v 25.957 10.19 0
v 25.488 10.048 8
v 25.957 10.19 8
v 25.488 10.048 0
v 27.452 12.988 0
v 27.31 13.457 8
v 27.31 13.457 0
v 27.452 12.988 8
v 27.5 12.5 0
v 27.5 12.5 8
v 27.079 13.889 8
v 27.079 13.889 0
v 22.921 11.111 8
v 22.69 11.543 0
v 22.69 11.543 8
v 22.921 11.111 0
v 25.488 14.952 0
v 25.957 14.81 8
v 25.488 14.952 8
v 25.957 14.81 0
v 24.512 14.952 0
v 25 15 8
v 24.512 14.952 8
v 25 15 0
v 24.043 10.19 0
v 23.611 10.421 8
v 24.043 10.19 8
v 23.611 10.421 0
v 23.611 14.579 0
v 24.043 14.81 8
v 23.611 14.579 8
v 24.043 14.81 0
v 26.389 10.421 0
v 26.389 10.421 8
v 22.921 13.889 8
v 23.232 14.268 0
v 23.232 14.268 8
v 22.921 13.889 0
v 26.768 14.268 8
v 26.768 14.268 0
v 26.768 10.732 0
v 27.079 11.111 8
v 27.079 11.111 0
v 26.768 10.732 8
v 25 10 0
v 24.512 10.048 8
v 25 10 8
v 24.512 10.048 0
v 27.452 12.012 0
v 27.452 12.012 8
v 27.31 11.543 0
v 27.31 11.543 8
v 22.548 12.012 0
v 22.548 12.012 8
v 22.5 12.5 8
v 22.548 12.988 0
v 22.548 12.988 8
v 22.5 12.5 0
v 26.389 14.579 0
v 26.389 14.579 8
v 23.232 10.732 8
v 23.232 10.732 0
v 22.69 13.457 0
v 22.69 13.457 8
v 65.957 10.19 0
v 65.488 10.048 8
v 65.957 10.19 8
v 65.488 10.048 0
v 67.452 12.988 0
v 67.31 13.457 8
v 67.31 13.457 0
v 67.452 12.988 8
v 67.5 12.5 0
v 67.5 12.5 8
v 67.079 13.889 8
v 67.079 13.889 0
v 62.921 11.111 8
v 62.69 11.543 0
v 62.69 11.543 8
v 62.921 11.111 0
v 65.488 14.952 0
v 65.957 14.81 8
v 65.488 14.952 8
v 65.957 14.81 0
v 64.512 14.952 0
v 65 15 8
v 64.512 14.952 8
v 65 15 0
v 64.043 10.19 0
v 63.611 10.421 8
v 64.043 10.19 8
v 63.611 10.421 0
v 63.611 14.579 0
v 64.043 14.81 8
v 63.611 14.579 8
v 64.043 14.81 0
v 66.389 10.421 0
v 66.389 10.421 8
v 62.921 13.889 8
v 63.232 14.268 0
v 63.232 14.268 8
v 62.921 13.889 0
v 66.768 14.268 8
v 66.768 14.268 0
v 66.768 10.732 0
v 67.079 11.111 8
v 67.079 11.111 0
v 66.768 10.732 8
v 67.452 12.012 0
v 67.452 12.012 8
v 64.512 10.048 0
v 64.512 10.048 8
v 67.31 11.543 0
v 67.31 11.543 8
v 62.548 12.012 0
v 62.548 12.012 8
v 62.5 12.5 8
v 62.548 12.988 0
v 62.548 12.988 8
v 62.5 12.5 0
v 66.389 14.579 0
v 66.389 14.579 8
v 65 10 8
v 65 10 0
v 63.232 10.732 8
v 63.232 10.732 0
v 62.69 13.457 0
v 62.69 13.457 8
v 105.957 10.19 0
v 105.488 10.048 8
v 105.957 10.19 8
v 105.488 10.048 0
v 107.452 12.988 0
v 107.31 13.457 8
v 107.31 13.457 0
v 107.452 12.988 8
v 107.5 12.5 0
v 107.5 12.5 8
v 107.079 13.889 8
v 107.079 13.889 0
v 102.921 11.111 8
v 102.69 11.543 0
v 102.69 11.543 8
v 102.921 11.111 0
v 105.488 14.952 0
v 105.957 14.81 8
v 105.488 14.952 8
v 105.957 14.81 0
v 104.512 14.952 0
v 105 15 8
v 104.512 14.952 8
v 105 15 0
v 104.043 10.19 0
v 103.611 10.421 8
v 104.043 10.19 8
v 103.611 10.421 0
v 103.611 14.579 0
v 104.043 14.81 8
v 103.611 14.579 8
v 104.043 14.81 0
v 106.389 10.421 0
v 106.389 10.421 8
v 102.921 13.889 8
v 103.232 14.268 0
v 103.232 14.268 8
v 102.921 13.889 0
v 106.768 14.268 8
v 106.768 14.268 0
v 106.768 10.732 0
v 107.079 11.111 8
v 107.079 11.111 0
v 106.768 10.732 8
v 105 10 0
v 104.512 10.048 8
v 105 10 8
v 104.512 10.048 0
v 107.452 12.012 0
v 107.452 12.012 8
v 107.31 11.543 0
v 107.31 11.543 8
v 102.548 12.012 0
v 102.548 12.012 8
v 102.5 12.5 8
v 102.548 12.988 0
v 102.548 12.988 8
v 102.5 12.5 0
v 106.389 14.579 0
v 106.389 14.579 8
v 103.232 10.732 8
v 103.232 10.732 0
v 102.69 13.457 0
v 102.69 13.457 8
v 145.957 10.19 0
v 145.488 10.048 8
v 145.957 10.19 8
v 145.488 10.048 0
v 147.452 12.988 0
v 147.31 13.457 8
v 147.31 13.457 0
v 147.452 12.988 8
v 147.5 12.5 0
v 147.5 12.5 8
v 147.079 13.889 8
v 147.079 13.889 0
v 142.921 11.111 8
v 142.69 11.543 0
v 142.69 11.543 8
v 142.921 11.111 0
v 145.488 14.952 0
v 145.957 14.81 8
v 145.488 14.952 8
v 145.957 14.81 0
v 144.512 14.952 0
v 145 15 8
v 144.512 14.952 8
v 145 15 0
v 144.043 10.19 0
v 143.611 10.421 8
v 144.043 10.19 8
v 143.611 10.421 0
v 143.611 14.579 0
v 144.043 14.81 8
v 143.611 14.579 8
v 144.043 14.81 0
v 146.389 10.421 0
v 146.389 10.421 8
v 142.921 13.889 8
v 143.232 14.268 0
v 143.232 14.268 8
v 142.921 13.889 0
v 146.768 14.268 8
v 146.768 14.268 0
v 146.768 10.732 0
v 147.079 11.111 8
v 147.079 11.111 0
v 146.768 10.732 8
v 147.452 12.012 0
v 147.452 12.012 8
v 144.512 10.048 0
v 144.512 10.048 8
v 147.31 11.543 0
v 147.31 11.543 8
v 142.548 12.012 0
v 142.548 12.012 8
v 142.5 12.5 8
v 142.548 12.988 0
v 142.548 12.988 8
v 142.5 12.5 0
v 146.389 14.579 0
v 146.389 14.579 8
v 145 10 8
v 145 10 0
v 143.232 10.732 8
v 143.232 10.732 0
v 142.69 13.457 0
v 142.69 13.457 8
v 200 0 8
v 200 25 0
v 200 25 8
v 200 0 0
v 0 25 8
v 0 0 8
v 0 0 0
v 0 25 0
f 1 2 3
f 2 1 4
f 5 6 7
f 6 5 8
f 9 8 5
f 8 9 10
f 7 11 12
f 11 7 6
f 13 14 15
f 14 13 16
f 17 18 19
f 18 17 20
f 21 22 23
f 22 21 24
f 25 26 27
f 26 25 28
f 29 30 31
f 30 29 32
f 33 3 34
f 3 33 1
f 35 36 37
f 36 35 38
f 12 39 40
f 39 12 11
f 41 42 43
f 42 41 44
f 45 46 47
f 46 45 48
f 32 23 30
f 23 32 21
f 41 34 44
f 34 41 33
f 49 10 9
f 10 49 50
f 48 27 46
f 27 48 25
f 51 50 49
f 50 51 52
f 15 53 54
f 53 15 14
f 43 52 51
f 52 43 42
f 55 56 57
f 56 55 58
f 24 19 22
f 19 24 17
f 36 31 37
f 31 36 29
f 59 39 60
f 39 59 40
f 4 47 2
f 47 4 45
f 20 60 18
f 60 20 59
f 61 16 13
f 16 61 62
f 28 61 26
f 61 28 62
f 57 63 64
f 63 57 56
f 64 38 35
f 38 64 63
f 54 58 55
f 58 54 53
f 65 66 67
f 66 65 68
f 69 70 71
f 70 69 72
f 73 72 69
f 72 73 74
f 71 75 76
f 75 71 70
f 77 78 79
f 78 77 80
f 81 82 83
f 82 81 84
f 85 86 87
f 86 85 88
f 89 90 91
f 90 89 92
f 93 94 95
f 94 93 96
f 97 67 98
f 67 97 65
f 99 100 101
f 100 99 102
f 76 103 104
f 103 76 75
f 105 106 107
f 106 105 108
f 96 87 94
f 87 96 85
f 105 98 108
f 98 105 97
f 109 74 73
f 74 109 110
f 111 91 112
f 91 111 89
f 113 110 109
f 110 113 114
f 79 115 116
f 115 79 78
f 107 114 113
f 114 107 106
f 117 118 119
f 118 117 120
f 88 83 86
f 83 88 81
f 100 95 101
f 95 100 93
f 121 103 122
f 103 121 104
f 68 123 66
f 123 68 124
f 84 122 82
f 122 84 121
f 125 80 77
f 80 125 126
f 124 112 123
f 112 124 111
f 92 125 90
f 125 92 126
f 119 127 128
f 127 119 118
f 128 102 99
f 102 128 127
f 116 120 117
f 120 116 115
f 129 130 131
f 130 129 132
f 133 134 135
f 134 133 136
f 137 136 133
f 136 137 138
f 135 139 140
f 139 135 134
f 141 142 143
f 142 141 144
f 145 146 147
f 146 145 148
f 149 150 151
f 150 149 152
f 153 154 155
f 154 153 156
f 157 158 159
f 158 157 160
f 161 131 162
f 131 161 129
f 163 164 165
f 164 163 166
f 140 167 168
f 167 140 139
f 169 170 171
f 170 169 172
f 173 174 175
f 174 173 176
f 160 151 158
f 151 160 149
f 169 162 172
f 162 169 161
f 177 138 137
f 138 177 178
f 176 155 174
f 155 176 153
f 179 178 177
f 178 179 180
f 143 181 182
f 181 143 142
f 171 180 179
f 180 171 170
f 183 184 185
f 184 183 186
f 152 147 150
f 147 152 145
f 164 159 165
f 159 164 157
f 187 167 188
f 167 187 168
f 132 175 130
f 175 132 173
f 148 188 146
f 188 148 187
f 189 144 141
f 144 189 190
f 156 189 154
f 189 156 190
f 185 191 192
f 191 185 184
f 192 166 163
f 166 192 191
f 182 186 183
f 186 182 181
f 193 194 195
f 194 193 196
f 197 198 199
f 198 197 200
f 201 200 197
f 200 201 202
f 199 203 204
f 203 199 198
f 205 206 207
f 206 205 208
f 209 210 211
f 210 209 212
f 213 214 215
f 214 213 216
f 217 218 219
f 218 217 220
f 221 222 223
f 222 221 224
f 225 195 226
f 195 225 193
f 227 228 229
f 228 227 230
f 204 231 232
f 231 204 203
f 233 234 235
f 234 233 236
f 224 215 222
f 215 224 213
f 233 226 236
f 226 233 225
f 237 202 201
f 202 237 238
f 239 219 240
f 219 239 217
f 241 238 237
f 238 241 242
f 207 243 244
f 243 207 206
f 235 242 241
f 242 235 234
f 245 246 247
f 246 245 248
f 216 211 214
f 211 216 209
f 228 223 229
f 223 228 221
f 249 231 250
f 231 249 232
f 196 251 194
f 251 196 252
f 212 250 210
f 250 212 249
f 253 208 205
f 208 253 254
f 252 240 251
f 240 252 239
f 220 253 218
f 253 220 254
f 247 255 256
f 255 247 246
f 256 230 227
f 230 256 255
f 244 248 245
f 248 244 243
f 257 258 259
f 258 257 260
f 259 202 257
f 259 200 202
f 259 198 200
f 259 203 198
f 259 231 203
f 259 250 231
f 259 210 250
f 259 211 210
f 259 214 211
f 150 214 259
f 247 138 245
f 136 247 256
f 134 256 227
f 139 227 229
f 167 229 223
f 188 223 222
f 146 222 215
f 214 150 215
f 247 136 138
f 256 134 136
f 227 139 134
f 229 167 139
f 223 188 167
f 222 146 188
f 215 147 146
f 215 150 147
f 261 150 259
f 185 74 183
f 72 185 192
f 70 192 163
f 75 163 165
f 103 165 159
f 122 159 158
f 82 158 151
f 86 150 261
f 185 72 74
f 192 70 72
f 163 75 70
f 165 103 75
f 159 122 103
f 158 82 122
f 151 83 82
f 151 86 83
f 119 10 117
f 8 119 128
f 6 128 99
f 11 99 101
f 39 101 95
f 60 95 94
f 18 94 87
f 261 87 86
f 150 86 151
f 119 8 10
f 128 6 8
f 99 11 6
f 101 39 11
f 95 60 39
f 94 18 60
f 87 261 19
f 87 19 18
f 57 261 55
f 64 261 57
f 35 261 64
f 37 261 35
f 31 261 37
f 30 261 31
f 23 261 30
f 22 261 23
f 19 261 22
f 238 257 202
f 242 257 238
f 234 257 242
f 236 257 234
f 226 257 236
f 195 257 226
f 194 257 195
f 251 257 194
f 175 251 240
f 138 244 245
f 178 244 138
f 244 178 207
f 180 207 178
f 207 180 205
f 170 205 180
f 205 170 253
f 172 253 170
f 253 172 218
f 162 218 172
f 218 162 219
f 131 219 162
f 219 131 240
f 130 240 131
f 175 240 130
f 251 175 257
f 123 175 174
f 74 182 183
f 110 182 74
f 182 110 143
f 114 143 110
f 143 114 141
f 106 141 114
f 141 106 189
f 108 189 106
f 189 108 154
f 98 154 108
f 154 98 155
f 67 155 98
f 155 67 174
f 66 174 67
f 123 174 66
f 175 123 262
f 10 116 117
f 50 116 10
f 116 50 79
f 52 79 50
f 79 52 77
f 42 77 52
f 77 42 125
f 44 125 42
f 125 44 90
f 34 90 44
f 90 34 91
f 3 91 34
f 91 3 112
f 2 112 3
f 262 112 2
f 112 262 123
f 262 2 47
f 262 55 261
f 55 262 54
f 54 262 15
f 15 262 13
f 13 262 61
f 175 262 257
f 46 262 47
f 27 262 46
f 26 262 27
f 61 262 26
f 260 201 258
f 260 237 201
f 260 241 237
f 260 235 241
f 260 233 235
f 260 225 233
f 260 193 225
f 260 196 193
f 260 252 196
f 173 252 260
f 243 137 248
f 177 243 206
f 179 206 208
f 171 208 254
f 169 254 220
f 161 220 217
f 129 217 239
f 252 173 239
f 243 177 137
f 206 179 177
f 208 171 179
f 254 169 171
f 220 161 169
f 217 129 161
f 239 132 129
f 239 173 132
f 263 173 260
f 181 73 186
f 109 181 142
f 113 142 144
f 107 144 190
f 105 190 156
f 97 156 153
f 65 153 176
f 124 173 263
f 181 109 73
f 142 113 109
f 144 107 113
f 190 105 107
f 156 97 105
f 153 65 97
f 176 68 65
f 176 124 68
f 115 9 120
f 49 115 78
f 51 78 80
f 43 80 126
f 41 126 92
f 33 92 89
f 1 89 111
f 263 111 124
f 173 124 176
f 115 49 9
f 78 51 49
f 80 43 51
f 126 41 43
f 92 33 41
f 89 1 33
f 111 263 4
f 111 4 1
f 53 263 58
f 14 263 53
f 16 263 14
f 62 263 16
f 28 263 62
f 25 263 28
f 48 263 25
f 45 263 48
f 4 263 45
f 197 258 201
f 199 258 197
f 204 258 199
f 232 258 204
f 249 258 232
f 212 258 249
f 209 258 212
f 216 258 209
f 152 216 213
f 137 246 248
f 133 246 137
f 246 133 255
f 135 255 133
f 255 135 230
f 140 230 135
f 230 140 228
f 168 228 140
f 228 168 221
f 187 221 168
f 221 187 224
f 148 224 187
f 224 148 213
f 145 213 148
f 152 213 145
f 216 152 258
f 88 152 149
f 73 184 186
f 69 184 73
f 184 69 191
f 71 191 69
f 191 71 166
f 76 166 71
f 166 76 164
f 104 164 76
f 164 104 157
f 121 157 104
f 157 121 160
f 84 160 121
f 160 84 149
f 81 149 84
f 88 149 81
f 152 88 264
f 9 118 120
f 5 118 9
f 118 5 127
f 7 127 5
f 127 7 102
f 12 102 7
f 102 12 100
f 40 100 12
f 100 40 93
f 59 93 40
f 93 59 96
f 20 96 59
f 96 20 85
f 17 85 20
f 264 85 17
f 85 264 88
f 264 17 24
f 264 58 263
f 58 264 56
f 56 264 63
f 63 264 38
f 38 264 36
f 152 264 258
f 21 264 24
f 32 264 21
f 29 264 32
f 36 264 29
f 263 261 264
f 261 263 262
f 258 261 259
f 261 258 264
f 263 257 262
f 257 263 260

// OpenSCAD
$fn = 32;

// ----------------------------------------------------------------------
// Long rail: 200-250 mm mounting rail
// ----------------------------------------------------------------------

// --- parameters (mm) ---
rail_l = 200;             // rail length, X
rail_w = 25;              // rail width, Y
rail_t = 8;               // rail thickness, Z
hole_d = 5;               // mounting hole diameter
hole_start = 25;          // first hole offset from the end
hole_pitch = 40;          // hole pitch
holes = 4;                // number of holes

difference() {
  cube([rail_l, rail_w, rail_t]);
  for (i = [0 : holes - 1])
    translate([hole_start + i * hole_pitch, rail_w / 2, -1])
      cylinder(h = rail_t + 2, d = hole_d);
}
